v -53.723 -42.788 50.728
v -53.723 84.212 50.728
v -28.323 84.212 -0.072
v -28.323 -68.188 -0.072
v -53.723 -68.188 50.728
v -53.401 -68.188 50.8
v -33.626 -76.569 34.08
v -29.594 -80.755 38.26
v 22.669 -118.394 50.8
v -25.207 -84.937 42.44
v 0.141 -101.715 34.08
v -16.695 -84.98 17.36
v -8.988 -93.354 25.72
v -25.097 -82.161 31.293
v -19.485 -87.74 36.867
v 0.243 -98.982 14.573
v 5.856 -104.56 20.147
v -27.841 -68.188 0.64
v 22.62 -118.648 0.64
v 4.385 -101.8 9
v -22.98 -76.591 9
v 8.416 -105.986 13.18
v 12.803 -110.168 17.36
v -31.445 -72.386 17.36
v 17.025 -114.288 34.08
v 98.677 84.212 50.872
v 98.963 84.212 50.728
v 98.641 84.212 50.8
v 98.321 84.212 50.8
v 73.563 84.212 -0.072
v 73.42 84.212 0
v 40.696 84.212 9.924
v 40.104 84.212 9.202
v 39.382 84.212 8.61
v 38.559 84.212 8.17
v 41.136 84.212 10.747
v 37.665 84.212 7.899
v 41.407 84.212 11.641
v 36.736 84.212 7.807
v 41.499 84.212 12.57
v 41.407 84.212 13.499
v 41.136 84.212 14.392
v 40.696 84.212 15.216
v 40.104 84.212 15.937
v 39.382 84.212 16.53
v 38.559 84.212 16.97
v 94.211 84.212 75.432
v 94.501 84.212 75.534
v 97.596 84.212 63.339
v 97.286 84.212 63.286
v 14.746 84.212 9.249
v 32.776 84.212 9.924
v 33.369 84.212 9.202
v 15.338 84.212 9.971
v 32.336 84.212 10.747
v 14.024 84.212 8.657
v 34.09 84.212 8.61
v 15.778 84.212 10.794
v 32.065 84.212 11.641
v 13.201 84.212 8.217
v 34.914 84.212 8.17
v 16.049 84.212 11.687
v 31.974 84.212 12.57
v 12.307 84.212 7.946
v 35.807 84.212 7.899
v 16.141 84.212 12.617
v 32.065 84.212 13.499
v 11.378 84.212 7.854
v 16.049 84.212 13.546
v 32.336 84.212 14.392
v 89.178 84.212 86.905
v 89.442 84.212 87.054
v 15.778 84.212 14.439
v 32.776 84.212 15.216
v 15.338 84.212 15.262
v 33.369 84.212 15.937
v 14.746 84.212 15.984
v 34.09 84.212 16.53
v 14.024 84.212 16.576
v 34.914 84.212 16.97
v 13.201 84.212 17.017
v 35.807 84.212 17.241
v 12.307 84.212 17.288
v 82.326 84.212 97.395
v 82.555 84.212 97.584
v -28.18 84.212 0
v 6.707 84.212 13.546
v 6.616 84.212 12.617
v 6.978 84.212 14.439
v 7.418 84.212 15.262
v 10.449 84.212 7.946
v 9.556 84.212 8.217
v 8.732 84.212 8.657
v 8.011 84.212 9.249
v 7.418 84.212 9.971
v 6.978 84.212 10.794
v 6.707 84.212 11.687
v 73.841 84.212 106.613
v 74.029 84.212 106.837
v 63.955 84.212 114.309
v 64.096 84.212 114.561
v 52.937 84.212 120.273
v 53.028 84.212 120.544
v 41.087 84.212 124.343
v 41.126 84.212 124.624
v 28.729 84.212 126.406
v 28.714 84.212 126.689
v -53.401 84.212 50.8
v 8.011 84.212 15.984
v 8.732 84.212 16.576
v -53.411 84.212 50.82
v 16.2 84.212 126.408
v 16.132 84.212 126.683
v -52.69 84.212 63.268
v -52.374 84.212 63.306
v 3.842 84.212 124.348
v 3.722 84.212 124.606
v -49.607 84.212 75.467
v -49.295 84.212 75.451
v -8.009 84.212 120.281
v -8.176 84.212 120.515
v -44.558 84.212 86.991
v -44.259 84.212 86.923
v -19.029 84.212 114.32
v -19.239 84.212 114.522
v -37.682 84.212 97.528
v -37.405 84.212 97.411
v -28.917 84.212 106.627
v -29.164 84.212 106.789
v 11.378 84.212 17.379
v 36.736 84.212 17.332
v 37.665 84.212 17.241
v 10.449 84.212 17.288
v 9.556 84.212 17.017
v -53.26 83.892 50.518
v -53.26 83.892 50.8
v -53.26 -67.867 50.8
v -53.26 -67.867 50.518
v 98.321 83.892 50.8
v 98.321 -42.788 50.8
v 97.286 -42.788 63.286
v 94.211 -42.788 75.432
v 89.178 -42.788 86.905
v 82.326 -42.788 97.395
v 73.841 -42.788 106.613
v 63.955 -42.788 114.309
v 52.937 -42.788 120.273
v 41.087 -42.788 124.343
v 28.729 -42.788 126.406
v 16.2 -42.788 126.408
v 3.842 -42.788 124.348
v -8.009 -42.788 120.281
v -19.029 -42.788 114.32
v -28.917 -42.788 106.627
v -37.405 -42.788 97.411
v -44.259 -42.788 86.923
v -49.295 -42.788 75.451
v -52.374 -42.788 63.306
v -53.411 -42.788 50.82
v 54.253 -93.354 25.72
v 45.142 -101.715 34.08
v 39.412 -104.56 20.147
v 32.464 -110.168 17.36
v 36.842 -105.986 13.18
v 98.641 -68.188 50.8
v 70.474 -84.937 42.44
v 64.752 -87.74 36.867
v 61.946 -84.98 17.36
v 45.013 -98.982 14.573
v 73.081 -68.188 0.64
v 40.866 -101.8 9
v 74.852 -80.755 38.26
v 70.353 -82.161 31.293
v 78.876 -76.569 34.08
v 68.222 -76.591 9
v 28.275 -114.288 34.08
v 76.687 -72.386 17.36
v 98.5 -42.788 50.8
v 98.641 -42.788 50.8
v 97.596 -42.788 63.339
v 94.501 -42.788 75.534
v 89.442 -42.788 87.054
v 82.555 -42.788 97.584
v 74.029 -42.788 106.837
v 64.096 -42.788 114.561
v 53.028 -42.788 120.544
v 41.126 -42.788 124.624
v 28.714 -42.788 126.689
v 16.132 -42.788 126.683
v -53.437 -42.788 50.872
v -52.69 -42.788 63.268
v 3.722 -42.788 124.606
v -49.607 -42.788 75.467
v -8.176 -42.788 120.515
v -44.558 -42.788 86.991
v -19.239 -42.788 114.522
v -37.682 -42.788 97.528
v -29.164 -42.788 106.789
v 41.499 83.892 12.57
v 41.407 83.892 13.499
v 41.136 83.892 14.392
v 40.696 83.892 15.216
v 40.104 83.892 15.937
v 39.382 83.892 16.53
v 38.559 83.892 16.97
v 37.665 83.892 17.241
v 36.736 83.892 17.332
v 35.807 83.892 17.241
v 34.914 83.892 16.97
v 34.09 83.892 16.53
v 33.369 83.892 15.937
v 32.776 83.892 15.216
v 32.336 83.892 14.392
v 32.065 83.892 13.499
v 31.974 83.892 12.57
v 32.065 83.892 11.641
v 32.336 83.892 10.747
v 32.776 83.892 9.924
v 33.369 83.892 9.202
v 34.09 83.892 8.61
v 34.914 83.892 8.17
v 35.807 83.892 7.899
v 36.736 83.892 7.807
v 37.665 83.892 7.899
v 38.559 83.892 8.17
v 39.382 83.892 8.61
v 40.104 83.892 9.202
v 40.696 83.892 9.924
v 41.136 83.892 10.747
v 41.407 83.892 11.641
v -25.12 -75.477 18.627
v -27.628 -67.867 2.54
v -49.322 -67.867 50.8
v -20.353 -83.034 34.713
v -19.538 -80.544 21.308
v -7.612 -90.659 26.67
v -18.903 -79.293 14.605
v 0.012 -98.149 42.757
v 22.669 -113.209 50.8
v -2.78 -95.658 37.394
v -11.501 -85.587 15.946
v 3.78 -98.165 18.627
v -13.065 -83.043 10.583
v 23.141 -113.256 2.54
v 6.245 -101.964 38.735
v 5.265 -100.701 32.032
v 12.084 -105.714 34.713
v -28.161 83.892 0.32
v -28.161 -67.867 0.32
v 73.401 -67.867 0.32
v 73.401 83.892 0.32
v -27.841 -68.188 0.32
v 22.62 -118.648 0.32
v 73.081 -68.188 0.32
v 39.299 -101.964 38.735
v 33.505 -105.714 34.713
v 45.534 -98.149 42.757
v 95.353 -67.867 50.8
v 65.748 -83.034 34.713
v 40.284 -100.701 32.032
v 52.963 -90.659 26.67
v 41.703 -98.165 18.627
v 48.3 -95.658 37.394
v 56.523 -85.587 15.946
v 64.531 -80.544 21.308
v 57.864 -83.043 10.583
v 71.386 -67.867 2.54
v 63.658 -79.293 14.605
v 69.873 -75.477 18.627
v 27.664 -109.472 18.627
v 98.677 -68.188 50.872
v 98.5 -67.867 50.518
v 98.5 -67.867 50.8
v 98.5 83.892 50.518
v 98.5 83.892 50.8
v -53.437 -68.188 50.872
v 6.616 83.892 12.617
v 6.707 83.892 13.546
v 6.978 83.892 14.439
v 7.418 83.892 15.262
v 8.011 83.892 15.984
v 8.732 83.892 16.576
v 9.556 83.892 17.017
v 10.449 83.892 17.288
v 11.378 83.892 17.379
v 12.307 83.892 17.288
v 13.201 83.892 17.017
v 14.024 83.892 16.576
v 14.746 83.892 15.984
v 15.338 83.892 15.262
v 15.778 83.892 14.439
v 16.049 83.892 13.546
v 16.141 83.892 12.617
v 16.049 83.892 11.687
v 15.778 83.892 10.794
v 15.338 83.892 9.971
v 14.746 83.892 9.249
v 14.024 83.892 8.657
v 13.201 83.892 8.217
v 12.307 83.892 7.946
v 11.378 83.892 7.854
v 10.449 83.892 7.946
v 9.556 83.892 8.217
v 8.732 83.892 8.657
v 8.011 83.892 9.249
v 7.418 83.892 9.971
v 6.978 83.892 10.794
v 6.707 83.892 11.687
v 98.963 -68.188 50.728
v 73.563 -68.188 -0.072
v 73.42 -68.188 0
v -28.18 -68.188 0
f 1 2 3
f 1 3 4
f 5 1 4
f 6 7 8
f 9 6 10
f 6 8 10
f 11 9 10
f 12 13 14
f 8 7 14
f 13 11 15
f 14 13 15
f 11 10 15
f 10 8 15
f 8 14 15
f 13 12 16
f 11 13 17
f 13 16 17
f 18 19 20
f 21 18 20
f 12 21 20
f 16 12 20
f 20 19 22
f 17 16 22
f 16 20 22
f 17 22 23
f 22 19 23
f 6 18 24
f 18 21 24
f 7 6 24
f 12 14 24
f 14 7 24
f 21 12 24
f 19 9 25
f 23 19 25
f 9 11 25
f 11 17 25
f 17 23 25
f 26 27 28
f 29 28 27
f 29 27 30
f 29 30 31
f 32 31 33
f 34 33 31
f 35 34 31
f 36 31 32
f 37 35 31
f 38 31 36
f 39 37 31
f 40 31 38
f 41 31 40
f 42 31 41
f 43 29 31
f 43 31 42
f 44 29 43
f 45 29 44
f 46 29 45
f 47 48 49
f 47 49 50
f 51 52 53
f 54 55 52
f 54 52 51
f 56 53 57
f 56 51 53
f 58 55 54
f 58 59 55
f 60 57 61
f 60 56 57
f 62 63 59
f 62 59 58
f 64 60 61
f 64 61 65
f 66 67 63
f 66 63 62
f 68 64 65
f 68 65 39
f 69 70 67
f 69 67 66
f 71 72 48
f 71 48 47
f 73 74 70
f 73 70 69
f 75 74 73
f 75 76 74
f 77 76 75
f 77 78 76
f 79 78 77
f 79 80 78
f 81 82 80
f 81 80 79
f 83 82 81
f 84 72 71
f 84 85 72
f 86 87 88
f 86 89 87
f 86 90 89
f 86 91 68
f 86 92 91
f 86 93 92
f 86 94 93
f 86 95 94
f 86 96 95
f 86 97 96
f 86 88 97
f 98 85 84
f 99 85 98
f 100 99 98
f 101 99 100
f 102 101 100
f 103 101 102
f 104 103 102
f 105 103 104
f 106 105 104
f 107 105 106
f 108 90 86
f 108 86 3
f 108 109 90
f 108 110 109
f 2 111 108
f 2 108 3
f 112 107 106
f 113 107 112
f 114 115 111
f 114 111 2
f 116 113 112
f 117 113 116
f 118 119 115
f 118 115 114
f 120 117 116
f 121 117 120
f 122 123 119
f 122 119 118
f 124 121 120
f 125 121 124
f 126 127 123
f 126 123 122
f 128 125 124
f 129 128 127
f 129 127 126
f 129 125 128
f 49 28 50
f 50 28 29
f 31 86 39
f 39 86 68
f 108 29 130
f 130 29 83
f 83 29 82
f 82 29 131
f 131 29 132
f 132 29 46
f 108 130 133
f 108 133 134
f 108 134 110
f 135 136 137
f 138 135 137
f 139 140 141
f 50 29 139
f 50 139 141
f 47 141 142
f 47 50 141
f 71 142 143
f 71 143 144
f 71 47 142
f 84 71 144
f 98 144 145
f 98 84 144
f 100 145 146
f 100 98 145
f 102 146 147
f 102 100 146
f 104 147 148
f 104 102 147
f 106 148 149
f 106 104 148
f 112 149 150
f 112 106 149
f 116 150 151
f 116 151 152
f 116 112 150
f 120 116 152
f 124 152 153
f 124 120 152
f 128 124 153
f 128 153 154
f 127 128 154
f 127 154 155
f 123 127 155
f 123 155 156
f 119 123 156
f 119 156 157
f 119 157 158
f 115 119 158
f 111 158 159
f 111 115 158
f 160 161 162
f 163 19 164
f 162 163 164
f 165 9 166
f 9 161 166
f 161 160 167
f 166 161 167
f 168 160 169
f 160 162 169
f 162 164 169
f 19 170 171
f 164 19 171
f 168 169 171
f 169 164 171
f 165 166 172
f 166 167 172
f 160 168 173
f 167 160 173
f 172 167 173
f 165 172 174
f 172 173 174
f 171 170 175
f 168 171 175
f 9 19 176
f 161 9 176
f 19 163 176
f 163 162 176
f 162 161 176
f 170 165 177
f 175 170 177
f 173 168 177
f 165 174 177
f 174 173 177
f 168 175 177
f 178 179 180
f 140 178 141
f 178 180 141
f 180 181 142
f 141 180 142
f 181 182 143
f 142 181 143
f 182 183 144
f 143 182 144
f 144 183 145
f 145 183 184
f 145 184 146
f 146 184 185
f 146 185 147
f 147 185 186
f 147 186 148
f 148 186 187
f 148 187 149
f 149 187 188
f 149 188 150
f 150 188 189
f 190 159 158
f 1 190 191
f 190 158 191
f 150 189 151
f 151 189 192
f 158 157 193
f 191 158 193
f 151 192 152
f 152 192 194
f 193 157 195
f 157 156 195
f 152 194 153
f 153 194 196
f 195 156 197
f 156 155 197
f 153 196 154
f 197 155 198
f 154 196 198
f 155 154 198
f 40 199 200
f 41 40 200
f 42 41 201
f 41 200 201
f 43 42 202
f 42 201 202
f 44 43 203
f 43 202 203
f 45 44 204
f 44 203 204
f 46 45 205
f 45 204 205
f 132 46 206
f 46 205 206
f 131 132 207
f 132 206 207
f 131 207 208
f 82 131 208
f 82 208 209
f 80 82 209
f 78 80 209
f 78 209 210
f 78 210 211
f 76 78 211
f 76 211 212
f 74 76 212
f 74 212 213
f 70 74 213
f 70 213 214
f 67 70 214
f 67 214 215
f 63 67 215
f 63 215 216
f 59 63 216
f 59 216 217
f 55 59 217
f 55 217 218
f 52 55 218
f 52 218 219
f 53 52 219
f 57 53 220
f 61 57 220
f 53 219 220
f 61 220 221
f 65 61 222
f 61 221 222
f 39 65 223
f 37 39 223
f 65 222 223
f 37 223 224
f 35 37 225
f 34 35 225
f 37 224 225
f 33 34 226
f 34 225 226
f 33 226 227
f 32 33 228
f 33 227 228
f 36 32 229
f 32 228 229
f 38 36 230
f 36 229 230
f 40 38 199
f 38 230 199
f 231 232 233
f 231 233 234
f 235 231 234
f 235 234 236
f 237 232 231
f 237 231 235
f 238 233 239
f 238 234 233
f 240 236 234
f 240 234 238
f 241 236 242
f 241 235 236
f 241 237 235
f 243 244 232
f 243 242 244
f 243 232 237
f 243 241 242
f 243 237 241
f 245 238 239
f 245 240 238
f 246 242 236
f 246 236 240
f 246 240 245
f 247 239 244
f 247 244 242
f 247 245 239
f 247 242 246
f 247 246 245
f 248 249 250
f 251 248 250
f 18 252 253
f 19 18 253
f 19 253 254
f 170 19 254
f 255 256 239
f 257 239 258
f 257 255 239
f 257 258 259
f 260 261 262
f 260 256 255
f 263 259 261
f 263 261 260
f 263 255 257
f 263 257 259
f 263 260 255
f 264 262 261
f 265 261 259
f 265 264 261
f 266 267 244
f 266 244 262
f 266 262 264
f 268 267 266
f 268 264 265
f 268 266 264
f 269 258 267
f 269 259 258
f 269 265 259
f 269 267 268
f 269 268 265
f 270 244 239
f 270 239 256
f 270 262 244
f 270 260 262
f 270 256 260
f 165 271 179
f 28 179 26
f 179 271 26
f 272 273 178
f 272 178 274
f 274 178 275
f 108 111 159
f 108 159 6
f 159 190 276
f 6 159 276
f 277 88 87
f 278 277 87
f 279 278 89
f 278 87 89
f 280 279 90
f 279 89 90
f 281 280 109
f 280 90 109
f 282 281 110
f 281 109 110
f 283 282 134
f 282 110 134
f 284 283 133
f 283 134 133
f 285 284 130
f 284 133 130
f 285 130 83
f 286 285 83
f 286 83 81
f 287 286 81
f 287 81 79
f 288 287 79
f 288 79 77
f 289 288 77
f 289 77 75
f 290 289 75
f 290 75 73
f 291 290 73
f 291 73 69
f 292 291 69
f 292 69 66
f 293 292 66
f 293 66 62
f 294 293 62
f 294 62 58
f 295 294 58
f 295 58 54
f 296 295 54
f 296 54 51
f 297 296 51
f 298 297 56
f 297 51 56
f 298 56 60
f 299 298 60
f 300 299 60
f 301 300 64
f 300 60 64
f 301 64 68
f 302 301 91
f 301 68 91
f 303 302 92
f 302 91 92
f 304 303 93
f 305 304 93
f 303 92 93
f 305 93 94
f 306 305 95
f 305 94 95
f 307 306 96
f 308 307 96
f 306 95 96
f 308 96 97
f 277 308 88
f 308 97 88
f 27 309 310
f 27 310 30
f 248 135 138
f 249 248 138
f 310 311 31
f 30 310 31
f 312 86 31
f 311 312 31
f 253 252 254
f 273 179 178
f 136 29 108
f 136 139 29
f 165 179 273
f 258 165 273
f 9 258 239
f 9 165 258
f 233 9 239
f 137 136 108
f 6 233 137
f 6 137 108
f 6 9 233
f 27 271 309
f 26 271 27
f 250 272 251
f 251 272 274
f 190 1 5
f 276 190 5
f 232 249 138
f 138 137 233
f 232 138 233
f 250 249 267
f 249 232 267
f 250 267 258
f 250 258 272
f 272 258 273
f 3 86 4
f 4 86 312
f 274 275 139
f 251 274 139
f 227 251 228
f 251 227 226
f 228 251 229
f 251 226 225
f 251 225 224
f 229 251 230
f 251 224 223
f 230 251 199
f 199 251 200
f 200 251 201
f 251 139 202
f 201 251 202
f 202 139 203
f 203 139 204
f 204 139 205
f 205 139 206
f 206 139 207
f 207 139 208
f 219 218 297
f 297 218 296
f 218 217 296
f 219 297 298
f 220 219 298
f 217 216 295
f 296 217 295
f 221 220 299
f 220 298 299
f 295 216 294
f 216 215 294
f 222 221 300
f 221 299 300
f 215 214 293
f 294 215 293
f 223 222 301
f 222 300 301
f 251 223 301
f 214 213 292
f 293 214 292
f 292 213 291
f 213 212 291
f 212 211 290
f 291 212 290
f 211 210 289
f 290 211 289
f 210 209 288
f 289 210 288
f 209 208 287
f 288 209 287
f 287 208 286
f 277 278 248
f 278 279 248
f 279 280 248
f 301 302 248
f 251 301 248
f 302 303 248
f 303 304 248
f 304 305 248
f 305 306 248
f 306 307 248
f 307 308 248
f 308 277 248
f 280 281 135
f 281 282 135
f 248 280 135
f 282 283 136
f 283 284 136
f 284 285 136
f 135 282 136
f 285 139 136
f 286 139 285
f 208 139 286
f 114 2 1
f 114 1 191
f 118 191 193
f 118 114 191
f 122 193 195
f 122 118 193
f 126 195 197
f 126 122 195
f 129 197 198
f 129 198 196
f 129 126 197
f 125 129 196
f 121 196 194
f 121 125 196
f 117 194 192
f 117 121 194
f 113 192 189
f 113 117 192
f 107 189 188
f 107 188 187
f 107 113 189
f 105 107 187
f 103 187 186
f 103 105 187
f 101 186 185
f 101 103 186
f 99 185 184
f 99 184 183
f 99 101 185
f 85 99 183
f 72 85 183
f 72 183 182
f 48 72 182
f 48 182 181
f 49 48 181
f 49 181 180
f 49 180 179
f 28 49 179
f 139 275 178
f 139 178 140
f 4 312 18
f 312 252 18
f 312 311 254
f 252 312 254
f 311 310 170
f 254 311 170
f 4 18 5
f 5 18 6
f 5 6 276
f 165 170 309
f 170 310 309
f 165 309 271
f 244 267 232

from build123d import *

# Parameters (mm, degrees)
F0_W           = 152.4
F0_H           = 152.4
F1_DEPTH       = 63.5
F3_DEPTH       = 63.17996
F4_DEPTH       = 12.7
F6_DEPTH       = 609.6
F7_W           = 152.4
F7_H           = 56.7961266285
F8_DEPTH       = 0.16002
F8_DEPTH_BACK  = 0.16002
F9_W           = 152.4
F9_H           = 56.7961266285
F10_DEPTH      = 0.16002
F10_DEPTH_BACK = 0.16002
F12_DEPTH      = 0.32004
F19_DEPTH      = 127
F24_D          = 9.525
F24_DEPTH      = 38.1
F24_TIP        = 2.8615986981
F26_DEPTH      = 25.4


with BuildPart() as f1:
    # F0 (on Top) → F1 (new body)
    with BuildSketch(Plane.XY):
        with Locations((22.6197618335, 8.0124375336)):
            Rectangle(F0_W, F0_H)
    extrude(amount=F1_DEPTH)

    # F2 (on face) → F3 (cut)
    with BuildSketch(Plane.XY.offset(63.5)):
        Polygon((22.6197618335, 83.8923975336), (-53.2601981665, 83.8923975336), (-53.2601981665, -0.1986662101), (-53.2601981665, -67.8672684664), (22.6197618335, -67.8672684664), (98.4997218335, -67.8672684664), (98.4997218335, -5.9687194955), (98.4997218335, 83.8923975336), align=None)
    extrude(amount=-F3_DEPTH, mode=Mode.SUBTRACT)

    # F4 (cut): a face of the model
    f4_faces = [f1.faces().sort_by_distance(p)[0] for p in [
        (22.6197618335, 83.9969113867, 63.5),
    ]]
    extrude(f4_faces, amount=-F4_DEPTH, mode=Mode.SUBTRACT)

    # F5 (on face) → F6 (cut)
    with BuildSketch(Plane(origin=(0, 84.2124375336, 0), x_dir=(-1, 0, 0), z_dir=(0, 1, 0))):
        Polygon((-73.4197618335, 0), (-98.8197618335, 50.8), (-98.8197618335, 0), align=None)
        Polygon((53.5802381665, 0), (53.5802381665, 50.8), (28.1802381665, 0), align=None)
    extrude(amount=-F6_DEPTH, mode=Mode.SUBTRACT)

    # F7 (on face) → F8 (join, two sides)
    with BuildSketch(Plane(origin=(58.7358094668, 0, -29.3679047334), x_dir=(0, 1, 0), z_dir=(0.894427191, 0, -0.4472135955))) as f8_sk:
        with Locations((8.0124375336, 61.2323789846)):
            Rectangle(F7_W, F7_H)
    extrude(amount=-F8_DEPTH)
    extrude(f8_sk.sketch, amount=F8_DEPTH_BACK)

    # F9 (on face) → F10 (join, two sides)
    with BuildSketch(Plane(origin=(-22.5441905332, 0, -11.2720952666), x_dir=(0, -1, 0), z_dir=(-0.894427191, 0, -0.4472135955))) as f10_sk:
        with Locations((-8.0124375336, 41.0006489467)):
            Rectangle(F9_W, F9_H)
    extrude(amount=F10_DEPTH)
    extrude(f10_sk.sketch, amount=-F10_DEPTH_BACK)

    # F11 (on face) → F12 (join)
    with BuildSketch(Plane.XY.offset(0.32004)):
        Polygon((73.4008740347, -67.8672684664), (-28.1613503676, -67.8672684664), (22.6197618335, -118.6483806675), align=None)
    extrude(amount=F12_DEPTH)

    # F13 (on face) → F14 section 0
    with BuildSketch(Plane.XY.offset(50.8)):
        Polygon((98.6408540347, -68.1875624664), (-53.4013303676, -68.1875624664), (22.6690676063, -118.3943599463), align=None)
    # F12_face (on face) → F14 section 1
    with BuildSketch(Plane(origin=(22.6197618335, -85.0078352001, 0.64008), x_dir=(1, 0, 0), z_dir=(0, 0, 1))):
        Polygon((-50.4608182011, 16.8202727337), (0, -33.6405454674), (50.4608182011, 16.8202727337), align=None)
    loft()

    # F18 (on face) → F19 (join)
    with BuildSketch(Plane(origin=(0, 84.2124375336, 0), x_dir=(-1, 0, 0), z_dir=(0, 1, 0))):
        with BuildLine():
            Line((53.4371119273, 50.8715631196), (53.7233644056, 50.7284368804))
            ThreePointArc((53.7233644056, 50.7284368804), (-22.4229632548, 126.9463276603), (-98.6408540347, 50.8))
            Line((-98.6408540347, 50.8), (-98.3208140347, 50.8))
            ThreePointArc((-98.3208140347, 50.8), (-22.464787963, 126.6661203454), (53.4114253128, 50.8201898905))
            Line((53.4114253128, 50.8201898905), (53.4371119273, 50.8715631196))
        make_face()
    extrude(amount=-F19_DEPTH)

    # F15 (on face) → F20 section 0
    with BuildSketch(Plane.XY.offset(50.8)):
        Polygon((-49.3224896491, -67.8672684664), (22.6690676063, -113.2092401385), (95.3528803221, -67.8672684664), align=None)
    # F17 (on offset) → F20 section 1
    with BuildSketch(Plane(origin=(0, 0, 2.54), x_dir=(1, 0, 0), z_dir=(0, 0, -1))):
        Polygon((23.141015321, 113.2561042905), (-28.1210406962, 67.4263015389), (71.8552097678, 67.4263015389), align=None)
    loft(mode=Mode.SUBTRACT)

    # F24
    with Locations(Plane(origin=(0, 84.2124375336, 0), x_dir=(-1, 0, 0), z_dir=(0, 1, 0))):
        with Locations((-36.7363579571, 12.5697767362)):
            Hole(F24_D / 2, depth=F24_DEPTH)
            with Locations((0, 0, -(F24_DEPTH + F24_TIP / 2))):  # 118° drill point
                Cone(0, F24_D / 2, F24_TIP, mode=Mode.SUBTRACT)

    # F25 (on face) → F26 (cut)
    with BuildSketch(Plane(origin=(0, 84.2124375336, 0), x_dir=(-1, 0, 0), z_dir=(0, 1, 0))):
        with BuildLine():
            ThreePointArc((-16.1407376707, 12.6165375113), (-11.3782376707, 7.8540375113), (-6.6157376707, 12.6165375113))
            ThreePointArc((-6.6157376707, 12.6165375113), (-11.3782376707, 17.3790375113), (-16.1407376707, 12.6165375113))
        make_face()
    extrude(amount=-F26_DEPTH, mode=Mode.SUBTRACT)


solid = f1.part
